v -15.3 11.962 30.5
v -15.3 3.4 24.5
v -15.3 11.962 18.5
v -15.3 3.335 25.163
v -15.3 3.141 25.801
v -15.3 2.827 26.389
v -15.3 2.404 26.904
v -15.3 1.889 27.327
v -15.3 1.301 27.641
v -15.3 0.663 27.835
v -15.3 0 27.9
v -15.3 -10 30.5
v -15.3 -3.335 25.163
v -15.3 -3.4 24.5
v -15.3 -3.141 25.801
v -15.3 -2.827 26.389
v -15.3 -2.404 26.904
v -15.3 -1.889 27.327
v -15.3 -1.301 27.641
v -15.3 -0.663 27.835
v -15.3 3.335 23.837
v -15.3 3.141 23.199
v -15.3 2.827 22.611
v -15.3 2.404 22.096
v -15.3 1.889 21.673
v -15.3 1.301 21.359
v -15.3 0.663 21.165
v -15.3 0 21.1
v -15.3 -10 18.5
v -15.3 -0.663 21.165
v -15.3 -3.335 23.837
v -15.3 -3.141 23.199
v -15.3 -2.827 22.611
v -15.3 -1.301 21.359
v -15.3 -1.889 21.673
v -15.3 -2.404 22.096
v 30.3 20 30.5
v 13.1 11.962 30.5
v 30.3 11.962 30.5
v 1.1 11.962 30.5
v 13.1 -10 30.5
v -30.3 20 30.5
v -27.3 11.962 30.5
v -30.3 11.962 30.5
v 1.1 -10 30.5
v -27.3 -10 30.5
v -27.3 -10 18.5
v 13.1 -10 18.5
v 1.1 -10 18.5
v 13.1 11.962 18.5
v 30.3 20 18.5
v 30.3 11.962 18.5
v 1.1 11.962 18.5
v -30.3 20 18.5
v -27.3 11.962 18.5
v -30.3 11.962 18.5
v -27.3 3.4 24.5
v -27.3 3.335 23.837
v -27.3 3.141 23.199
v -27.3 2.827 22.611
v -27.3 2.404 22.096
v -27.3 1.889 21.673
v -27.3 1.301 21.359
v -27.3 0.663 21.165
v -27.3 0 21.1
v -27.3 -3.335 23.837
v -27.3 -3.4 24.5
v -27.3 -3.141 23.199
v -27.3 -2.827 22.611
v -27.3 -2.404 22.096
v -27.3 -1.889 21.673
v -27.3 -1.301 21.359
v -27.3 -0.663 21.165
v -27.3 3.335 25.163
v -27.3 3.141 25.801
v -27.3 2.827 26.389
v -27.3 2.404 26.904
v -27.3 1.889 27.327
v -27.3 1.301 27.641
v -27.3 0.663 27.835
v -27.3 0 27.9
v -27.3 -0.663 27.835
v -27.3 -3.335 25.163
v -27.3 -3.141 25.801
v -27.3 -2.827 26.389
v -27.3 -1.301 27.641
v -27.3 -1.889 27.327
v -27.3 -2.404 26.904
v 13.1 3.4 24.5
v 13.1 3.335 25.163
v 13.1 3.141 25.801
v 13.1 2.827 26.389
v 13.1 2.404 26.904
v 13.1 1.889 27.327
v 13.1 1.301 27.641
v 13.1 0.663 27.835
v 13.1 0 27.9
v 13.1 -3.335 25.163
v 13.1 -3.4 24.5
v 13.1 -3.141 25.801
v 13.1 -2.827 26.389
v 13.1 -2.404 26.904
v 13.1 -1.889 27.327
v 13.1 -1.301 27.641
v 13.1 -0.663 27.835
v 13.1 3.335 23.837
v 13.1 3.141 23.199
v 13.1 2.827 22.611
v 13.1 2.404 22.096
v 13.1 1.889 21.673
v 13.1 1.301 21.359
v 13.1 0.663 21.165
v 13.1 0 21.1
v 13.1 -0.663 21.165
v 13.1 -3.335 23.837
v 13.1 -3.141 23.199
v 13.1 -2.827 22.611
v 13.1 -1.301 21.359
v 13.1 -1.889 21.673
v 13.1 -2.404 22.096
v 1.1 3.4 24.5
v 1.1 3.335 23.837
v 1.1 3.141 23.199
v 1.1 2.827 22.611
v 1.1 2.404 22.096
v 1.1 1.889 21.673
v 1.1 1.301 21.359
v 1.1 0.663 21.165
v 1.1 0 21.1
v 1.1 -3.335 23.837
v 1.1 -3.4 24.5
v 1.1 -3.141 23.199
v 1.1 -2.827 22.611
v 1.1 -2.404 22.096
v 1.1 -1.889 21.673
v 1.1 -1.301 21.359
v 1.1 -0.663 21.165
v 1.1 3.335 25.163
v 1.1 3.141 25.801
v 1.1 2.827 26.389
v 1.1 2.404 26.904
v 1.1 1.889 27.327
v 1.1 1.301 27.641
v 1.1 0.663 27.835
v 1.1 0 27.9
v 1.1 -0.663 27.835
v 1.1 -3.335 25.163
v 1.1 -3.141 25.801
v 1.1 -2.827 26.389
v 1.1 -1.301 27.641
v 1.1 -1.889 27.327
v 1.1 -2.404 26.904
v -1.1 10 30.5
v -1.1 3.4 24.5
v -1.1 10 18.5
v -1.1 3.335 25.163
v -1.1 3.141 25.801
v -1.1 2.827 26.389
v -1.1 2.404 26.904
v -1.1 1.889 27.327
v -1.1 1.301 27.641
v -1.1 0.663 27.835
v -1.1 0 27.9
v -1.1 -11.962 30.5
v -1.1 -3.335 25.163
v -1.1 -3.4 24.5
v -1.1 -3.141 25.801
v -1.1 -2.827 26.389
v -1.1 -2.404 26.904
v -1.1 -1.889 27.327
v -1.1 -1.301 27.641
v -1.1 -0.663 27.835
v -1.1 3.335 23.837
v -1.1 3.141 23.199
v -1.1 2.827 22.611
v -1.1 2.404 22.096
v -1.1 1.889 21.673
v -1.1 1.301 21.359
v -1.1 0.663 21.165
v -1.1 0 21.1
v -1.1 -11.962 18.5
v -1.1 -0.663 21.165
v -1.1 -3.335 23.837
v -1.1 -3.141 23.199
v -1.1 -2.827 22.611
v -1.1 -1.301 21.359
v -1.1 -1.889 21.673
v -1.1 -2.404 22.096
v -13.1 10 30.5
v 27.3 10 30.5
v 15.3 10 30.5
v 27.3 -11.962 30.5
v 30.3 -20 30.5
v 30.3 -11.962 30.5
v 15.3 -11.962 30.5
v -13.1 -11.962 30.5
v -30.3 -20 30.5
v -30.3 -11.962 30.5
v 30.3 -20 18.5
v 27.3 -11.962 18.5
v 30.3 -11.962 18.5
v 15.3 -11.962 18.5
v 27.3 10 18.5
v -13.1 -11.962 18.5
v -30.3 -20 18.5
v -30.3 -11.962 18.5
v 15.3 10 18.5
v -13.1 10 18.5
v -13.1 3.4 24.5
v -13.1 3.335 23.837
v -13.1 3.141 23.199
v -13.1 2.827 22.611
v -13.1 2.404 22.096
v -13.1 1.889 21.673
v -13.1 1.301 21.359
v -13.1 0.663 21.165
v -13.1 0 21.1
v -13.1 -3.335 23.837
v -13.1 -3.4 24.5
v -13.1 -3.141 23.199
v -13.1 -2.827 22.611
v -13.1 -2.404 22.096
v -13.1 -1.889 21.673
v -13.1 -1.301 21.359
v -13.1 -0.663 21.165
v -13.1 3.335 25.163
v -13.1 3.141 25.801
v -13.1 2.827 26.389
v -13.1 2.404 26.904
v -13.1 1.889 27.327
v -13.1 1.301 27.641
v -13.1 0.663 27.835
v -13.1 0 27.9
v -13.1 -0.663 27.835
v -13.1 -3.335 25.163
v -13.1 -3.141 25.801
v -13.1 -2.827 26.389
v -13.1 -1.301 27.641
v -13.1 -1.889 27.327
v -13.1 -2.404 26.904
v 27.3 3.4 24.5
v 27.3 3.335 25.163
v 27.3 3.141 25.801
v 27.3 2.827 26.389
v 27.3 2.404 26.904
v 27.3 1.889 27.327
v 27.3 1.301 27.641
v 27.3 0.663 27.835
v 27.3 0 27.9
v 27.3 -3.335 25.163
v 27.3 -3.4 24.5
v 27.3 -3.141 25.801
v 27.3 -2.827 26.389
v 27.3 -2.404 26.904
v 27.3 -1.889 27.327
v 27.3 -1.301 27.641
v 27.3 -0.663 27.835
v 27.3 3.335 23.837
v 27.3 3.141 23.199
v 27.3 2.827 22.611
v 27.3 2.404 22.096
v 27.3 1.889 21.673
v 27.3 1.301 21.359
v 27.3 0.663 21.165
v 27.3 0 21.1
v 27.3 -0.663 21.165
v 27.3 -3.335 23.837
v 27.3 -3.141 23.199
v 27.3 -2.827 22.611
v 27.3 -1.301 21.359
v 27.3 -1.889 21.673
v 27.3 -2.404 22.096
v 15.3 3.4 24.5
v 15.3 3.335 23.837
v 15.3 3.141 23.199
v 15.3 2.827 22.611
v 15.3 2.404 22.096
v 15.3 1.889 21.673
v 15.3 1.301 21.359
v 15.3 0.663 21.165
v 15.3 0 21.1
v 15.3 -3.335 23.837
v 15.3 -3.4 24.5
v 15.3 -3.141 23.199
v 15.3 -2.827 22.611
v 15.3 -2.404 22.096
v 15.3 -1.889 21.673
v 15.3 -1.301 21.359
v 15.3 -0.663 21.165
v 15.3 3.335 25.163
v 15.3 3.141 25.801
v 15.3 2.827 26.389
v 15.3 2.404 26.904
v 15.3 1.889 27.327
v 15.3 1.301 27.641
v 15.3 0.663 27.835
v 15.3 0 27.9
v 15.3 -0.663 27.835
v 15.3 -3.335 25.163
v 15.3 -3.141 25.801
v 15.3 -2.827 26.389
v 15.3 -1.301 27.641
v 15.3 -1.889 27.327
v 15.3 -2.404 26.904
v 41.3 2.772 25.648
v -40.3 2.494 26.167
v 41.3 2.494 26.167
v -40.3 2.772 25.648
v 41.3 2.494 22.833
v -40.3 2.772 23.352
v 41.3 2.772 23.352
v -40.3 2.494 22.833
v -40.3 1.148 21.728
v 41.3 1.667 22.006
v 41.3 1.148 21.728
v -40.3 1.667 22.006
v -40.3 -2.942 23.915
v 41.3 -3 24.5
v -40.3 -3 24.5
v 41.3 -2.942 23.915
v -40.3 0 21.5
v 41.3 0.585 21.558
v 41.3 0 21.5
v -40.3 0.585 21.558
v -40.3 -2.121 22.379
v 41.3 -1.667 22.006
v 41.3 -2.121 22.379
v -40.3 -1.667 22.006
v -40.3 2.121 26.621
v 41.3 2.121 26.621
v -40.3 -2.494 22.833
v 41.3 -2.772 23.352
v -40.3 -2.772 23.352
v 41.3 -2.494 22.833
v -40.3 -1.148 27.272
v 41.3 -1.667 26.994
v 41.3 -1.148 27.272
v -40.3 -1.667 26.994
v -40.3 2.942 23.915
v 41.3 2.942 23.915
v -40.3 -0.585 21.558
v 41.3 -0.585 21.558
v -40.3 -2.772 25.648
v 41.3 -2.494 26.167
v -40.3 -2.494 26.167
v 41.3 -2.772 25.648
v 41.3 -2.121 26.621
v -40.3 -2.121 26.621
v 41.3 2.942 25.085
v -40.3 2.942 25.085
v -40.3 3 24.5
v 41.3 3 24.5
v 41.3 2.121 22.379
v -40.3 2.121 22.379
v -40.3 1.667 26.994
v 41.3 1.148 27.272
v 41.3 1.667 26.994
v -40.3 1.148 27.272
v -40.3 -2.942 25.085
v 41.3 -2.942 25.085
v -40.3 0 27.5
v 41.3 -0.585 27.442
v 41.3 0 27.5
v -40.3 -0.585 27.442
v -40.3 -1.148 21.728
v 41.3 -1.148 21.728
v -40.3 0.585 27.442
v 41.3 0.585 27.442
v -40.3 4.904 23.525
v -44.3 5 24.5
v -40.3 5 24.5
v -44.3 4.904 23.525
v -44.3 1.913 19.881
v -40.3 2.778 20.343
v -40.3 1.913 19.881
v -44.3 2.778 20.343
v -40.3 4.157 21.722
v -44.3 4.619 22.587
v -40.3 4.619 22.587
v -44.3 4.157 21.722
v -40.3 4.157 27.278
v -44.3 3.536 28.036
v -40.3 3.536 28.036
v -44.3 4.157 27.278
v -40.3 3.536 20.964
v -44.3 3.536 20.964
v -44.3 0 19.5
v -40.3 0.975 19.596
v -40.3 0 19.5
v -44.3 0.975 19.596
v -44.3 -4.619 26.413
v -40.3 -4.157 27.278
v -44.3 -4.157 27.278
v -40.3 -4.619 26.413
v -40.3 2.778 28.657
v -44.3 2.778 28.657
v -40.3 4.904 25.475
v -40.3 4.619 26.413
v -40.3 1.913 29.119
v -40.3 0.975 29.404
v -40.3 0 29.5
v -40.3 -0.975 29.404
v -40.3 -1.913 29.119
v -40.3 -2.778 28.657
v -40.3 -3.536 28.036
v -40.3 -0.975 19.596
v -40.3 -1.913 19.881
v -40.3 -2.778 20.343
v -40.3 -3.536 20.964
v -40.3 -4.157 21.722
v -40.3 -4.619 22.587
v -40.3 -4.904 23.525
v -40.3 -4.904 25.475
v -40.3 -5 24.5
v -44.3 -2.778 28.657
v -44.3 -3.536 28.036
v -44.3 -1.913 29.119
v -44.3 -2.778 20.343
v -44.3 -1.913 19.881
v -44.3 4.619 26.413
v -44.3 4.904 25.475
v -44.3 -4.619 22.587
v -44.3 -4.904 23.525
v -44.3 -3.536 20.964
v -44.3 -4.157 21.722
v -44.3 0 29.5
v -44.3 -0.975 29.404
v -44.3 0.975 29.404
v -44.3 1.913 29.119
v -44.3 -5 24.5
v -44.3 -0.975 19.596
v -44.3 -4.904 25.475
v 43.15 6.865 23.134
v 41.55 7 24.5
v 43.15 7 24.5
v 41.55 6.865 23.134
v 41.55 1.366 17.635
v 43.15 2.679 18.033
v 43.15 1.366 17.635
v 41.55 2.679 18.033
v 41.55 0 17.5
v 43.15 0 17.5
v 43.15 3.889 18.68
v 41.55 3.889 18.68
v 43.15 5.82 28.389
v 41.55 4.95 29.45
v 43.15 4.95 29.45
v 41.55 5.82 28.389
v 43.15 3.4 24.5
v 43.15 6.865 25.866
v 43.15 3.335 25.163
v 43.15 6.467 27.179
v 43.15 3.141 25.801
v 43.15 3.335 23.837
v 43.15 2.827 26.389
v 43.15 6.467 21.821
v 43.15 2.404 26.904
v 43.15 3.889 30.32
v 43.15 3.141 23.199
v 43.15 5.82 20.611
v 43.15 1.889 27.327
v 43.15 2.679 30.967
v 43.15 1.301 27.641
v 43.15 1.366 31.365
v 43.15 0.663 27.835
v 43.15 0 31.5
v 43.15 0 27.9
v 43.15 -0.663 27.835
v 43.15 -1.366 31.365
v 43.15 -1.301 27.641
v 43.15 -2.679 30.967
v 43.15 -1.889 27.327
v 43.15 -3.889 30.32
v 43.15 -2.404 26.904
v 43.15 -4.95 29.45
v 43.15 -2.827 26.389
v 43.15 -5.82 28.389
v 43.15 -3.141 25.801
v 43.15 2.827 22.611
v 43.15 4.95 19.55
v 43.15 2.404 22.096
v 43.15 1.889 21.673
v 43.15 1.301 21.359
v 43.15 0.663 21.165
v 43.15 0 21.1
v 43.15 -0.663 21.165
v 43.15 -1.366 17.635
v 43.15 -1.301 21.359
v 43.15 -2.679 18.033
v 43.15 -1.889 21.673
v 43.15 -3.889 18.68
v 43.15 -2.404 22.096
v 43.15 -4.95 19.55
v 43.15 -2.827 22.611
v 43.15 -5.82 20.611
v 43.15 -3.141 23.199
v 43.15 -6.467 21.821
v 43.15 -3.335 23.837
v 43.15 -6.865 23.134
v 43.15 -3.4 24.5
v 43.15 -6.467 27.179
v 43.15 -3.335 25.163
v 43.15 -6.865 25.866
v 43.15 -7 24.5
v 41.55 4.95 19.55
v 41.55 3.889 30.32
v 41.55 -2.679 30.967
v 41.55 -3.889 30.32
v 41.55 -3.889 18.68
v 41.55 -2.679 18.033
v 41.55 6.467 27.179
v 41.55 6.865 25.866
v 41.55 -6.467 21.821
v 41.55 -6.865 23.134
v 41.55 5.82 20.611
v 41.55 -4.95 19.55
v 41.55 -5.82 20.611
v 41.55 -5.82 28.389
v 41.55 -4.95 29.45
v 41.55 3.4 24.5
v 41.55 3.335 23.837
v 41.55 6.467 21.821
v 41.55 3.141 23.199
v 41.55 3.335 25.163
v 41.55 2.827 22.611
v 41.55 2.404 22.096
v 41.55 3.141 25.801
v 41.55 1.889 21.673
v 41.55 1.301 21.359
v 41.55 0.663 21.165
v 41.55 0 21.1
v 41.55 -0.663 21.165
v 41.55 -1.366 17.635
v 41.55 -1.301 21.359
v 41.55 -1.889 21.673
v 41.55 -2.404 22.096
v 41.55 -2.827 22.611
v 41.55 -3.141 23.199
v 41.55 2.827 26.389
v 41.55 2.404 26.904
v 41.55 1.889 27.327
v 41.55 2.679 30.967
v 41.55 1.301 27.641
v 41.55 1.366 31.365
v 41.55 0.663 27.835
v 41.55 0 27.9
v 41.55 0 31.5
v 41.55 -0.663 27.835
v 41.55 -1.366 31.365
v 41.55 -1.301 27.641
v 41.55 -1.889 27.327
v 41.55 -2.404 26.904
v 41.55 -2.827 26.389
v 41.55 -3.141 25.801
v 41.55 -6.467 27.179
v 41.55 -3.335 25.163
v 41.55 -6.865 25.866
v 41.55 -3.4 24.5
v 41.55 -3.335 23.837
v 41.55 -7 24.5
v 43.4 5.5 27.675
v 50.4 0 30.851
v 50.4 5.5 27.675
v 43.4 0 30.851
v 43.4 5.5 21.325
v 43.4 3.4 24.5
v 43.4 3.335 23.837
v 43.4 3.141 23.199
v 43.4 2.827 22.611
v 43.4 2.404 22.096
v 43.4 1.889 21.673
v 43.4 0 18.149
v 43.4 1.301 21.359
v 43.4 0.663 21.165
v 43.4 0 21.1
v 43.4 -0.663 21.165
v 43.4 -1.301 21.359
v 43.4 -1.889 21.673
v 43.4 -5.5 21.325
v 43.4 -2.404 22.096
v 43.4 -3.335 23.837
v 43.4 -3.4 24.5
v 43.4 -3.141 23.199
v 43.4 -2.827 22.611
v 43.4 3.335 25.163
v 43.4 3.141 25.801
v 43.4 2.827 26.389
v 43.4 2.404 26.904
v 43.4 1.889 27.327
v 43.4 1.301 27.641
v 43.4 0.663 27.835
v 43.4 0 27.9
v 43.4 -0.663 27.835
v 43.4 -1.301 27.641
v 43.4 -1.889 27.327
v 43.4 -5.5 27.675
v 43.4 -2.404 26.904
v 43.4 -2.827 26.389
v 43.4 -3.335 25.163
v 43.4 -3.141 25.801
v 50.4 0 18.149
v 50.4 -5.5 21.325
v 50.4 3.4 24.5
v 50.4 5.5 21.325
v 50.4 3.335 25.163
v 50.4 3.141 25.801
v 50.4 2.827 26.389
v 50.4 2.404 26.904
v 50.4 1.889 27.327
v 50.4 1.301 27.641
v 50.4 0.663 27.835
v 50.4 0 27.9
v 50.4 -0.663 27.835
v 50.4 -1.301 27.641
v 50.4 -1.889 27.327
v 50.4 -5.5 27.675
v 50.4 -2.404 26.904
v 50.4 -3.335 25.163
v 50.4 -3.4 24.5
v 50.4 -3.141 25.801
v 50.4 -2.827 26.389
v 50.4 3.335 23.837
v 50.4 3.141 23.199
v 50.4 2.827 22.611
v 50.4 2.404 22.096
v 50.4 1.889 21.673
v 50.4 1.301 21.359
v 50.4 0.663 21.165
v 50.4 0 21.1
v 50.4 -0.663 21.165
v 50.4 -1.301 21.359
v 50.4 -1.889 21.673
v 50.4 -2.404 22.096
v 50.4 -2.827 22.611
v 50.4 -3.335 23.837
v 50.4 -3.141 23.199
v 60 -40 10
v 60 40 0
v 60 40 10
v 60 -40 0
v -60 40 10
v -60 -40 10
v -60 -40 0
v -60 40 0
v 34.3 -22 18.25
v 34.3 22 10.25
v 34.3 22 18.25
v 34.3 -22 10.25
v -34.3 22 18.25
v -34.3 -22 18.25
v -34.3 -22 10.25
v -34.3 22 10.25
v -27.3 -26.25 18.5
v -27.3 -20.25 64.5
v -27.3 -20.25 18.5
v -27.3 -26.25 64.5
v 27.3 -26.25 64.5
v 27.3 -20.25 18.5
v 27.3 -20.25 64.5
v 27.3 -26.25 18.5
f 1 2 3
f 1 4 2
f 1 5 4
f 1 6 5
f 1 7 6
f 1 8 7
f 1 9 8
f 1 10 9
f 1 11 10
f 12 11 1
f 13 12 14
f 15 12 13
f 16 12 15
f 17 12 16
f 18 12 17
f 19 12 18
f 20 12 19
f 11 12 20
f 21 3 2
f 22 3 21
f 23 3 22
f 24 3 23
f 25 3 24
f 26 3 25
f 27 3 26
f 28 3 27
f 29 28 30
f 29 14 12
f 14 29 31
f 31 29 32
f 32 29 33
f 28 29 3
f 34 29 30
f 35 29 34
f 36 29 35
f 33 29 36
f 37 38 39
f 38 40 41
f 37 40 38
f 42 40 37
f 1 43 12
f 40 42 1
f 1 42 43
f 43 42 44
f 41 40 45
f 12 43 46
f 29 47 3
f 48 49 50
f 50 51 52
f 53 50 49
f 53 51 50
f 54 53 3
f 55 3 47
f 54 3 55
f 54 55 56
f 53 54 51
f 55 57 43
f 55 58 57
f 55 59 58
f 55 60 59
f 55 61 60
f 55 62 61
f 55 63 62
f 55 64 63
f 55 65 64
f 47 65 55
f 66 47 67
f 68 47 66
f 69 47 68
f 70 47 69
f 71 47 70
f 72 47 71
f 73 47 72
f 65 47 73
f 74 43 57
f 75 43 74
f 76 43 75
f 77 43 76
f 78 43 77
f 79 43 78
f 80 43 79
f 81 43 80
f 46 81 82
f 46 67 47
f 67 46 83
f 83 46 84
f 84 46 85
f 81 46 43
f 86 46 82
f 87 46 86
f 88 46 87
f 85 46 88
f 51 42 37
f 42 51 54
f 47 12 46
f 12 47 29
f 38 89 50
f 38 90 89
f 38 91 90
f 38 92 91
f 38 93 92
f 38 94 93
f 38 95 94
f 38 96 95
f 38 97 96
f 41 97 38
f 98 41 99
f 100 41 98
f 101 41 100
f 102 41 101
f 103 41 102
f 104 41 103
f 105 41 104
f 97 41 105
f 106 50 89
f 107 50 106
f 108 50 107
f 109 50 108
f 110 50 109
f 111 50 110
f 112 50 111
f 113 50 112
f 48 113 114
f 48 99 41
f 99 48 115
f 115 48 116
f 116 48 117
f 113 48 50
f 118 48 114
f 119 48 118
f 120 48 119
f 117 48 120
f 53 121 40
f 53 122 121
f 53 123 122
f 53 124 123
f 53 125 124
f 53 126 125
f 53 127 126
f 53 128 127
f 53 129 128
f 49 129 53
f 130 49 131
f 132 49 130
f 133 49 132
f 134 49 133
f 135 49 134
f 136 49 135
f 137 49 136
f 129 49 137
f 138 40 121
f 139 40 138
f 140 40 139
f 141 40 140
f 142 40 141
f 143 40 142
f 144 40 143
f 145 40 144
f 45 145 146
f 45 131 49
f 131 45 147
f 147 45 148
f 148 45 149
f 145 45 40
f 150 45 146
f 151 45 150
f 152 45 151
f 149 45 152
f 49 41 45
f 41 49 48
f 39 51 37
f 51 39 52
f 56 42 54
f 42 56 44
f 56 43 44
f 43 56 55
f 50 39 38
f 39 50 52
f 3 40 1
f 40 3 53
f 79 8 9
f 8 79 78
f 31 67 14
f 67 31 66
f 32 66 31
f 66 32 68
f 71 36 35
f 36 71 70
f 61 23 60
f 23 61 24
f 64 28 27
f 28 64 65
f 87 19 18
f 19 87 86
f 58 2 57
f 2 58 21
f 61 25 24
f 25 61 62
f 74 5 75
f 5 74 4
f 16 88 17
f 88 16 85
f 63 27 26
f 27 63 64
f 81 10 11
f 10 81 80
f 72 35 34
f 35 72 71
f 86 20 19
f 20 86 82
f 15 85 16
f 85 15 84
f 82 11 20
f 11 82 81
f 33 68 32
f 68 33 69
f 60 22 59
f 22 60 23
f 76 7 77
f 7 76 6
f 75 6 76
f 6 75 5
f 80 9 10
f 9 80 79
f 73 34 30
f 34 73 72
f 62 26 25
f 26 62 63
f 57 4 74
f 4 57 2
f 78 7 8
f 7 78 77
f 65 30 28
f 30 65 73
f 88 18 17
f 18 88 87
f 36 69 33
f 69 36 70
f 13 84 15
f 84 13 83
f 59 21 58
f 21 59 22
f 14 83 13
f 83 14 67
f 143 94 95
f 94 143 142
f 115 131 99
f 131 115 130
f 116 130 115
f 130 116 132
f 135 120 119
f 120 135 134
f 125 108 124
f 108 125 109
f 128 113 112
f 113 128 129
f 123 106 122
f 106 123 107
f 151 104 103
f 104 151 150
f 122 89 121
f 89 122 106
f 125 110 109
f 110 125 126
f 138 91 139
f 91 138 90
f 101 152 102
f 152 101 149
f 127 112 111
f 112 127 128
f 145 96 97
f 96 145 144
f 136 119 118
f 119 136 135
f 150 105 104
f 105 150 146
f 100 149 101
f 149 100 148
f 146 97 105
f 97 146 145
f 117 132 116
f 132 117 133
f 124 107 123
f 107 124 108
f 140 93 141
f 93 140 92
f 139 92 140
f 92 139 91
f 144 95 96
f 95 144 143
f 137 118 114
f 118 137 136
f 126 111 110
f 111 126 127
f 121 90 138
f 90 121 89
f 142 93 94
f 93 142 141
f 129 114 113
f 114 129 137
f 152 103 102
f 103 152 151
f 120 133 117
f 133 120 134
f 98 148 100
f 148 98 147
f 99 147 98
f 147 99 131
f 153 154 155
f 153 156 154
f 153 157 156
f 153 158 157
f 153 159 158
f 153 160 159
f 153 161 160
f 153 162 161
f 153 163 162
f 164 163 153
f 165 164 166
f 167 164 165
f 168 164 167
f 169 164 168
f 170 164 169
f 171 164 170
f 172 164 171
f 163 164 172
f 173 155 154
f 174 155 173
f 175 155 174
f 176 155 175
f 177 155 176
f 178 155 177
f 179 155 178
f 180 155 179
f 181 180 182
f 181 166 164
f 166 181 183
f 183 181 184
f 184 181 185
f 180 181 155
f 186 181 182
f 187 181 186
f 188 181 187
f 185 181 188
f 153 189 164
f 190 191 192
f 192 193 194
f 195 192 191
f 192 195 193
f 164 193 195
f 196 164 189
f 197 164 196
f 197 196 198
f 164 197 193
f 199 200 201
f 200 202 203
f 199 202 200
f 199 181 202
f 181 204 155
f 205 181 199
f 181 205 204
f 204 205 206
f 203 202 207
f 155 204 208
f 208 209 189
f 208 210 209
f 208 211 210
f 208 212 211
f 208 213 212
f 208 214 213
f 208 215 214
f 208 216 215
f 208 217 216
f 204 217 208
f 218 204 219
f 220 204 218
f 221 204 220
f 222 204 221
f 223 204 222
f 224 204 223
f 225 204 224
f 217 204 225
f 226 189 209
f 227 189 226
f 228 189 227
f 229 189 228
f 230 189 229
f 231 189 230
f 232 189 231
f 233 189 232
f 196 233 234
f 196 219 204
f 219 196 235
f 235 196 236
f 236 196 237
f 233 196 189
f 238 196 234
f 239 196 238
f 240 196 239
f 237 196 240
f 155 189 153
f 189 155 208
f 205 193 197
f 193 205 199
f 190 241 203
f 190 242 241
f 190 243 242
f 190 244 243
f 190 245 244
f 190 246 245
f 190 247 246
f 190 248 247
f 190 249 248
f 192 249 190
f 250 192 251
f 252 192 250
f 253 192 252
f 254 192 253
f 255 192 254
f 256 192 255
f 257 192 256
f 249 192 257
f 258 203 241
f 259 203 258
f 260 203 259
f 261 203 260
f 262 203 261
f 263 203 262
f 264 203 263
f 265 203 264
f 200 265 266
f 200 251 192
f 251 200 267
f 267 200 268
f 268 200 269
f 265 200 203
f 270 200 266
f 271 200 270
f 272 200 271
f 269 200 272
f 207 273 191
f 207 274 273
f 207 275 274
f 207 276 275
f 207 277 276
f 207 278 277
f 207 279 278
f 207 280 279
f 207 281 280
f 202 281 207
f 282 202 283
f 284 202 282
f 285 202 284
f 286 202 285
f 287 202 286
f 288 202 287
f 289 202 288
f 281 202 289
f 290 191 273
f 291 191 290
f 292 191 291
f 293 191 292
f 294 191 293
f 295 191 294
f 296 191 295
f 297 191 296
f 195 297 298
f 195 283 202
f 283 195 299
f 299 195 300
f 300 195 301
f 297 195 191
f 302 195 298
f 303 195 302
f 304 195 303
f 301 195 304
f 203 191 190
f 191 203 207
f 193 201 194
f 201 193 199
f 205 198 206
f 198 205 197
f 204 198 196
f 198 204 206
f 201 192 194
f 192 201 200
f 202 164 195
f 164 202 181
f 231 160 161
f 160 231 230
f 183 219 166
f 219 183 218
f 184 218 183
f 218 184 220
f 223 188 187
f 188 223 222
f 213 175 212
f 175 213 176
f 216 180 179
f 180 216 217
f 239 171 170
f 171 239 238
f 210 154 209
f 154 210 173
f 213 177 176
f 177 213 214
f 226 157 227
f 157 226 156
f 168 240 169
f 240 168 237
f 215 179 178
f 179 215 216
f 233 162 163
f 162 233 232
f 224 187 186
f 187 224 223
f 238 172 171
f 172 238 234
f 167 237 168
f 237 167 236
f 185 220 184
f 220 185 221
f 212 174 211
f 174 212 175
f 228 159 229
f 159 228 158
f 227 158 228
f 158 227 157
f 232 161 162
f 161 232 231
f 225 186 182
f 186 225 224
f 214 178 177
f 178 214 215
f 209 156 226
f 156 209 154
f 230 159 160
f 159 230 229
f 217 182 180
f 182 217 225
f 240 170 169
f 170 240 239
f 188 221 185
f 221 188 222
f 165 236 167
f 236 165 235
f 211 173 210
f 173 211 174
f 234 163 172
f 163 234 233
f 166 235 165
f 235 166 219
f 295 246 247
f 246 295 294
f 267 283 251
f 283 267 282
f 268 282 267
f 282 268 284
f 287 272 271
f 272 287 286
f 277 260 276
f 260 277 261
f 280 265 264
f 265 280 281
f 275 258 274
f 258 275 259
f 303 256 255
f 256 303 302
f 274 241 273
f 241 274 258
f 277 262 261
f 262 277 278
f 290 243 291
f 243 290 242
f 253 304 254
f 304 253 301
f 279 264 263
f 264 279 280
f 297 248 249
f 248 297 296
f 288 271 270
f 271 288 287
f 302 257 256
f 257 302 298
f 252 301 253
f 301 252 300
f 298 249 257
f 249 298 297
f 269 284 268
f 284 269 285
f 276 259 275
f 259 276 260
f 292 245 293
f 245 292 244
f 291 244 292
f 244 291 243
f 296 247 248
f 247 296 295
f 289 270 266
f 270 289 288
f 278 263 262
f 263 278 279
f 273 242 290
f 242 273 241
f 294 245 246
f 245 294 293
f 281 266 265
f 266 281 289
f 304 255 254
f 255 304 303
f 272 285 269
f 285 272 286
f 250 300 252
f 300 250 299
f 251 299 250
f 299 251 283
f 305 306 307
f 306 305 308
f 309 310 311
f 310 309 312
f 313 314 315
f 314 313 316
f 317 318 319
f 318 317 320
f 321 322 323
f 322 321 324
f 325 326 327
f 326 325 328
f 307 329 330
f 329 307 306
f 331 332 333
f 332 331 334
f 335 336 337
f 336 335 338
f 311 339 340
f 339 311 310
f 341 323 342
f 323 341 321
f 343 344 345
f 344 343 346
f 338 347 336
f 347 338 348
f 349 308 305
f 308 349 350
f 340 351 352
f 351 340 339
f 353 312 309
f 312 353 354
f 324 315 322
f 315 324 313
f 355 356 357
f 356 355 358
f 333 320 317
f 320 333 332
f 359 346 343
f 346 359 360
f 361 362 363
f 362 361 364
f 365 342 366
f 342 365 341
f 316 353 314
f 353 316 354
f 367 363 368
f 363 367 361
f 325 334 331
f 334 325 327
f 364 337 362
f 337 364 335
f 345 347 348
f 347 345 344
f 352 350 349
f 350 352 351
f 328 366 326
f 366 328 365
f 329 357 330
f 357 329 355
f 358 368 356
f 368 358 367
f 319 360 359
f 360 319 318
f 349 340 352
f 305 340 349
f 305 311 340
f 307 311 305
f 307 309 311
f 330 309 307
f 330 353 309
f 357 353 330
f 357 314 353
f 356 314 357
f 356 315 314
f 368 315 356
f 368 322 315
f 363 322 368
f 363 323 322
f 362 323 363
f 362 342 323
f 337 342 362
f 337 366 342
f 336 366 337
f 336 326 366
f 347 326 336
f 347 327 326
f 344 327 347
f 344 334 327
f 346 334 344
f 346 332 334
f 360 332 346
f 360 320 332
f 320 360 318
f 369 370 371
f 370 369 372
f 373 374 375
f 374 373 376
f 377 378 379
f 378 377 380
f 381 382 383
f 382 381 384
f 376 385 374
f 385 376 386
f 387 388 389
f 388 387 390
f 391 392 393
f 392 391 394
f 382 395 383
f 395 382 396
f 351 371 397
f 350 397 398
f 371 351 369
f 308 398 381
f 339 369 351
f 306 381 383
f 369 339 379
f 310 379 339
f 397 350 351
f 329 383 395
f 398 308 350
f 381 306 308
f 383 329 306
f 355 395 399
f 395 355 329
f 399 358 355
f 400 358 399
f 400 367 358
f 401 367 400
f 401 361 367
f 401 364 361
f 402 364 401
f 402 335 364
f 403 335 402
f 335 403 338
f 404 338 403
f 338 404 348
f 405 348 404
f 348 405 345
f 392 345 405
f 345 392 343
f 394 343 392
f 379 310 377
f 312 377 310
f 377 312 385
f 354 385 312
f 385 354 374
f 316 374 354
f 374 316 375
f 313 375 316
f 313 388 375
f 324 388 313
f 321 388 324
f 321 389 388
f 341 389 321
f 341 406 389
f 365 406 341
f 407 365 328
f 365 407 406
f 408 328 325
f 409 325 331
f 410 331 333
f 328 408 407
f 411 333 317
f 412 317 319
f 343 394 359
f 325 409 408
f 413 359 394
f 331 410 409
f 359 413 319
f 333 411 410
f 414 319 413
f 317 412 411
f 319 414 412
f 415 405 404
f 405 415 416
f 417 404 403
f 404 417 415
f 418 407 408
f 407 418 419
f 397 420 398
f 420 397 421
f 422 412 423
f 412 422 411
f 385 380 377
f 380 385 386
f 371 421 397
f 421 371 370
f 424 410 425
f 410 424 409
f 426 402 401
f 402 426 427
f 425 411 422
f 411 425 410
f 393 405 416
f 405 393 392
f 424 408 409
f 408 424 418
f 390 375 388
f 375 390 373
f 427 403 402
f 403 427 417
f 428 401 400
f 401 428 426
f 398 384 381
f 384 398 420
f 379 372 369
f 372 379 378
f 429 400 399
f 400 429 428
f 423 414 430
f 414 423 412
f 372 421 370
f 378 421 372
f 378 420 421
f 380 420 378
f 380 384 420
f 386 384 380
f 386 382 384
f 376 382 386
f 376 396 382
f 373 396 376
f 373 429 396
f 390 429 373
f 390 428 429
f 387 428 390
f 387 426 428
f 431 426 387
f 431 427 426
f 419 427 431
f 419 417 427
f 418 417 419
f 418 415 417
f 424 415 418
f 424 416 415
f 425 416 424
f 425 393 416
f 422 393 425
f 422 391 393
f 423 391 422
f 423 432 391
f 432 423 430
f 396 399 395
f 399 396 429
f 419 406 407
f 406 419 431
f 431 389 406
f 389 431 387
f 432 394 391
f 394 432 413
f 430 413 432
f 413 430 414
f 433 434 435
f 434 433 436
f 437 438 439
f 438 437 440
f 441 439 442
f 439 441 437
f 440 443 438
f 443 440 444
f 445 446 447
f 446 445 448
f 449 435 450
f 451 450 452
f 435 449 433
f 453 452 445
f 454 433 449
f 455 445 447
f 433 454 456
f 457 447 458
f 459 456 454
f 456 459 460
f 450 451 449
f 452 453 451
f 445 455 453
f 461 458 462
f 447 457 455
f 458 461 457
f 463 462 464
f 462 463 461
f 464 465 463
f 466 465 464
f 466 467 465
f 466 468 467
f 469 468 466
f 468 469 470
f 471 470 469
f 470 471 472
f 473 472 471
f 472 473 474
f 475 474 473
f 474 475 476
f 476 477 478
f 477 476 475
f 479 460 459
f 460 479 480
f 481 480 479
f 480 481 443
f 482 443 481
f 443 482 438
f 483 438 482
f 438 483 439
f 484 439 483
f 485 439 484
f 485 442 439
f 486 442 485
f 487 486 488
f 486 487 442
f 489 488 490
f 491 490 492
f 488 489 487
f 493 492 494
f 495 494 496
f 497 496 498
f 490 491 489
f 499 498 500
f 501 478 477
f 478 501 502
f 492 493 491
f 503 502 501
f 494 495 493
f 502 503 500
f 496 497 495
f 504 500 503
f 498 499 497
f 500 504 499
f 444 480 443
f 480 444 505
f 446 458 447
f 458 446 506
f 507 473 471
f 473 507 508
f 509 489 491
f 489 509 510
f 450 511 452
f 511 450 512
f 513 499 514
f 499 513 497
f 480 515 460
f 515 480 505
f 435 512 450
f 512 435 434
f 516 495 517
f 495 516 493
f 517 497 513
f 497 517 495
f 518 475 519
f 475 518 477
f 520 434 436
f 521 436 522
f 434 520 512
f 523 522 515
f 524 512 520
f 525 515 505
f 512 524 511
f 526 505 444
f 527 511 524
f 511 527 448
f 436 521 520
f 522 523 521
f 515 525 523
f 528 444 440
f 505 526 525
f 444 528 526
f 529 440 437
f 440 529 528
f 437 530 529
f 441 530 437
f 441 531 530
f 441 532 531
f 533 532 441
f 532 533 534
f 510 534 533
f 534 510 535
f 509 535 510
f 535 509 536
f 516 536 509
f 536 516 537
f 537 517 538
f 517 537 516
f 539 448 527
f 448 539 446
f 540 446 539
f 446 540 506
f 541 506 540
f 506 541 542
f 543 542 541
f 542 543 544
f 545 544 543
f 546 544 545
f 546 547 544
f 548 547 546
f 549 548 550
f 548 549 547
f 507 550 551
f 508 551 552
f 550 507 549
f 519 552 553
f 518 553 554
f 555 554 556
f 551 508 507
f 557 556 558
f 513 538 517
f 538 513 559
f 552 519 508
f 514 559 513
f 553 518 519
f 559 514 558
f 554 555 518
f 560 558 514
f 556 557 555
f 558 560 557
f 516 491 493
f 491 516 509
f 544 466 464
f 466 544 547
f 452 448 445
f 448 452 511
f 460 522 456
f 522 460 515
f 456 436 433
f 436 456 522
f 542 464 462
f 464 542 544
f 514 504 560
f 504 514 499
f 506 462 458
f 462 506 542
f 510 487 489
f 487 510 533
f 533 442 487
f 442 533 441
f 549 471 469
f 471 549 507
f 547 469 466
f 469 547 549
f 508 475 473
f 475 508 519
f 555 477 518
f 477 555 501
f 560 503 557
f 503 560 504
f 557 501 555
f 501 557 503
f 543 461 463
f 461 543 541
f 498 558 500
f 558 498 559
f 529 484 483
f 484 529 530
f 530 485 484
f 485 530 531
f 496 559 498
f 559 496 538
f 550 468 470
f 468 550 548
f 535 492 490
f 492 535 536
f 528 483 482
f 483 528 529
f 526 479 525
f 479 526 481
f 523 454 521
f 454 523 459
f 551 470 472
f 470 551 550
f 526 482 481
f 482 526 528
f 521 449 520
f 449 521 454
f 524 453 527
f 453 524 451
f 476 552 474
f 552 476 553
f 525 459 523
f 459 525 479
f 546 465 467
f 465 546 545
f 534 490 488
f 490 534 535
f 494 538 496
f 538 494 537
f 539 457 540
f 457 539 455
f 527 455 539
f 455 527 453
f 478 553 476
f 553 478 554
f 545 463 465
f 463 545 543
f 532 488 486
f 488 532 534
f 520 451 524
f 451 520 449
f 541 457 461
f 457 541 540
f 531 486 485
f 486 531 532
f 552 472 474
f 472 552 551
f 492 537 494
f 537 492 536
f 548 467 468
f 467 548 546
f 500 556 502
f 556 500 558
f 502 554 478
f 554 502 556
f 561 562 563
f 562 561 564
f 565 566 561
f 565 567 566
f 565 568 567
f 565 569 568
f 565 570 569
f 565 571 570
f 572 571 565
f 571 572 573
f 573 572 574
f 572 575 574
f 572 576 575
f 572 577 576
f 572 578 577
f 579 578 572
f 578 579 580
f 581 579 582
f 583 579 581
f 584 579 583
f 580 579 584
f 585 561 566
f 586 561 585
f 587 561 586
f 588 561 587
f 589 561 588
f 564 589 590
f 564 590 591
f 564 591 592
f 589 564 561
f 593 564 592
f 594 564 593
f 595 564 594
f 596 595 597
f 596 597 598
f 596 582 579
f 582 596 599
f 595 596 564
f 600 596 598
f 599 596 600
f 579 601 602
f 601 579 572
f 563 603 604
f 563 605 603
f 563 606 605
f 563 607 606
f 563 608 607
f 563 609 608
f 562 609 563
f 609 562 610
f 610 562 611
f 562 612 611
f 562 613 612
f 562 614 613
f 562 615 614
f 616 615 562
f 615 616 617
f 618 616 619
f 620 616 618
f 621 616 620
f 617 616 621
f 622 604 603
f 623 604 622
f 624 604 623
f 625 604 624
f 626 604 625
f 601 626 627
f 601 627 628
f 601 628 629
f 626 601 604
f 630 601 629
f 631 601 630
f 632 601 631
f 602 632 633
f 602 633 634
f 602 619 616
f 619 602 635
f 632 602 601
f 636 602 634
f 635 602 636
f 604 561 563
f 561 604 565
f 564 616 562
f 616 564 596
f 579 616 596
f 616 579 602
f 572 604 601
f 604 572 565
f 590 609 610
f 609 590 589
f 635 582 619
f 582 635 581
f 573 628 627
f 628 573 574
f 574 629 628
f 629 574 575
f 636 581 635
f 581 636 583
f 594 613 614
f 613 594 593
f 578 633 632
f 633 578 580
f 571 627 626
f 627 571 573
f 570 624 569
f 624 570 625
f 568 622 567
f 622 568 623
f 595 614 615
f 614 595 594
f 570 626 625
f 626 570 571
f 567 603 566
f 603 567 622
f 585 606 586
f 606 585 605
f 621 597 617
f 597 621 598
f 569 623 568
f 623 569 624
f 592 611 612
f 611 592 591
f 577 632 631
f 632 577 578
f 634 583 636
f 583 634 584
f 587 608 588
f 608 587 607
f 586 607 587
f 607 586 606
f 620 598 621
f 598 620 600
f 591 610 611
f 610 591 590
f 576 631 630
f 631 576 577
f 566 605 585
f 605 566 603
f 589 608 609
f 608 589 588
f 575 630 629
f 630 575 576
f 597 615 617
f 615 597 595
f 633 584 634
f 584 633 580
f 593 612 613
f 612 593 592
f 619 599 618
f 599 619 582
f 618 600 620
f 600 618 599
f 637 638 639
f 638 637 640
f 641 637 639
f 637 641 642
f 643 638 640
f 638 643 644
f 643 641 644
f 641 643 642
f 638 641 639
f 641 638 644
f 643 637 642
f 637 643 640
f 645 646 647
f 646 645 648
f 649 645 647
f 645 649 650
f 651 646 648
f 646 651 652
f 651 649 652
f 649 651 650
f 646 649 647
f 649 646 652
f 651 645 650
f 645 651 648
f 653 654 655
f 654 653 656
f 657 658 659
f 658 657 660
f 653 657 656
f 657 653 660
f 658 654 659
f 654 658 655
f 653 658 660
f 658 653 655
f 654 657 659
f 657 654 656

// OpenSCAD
$fn = 32;

// ------------------------------------------------------------------------
// Comb hinge with flap: leaf 60.6 x 20 mm, pin d6, flap 46 mm
// Every part is its own module, assembly() places every instance.
// ------------------------------------------------------------------------

// --- part 1 ---
module hinge_bed() {
  difference() {
    translate([-60, -40, 0]) cube([120, 80, 10]);
  }
}

// --- part 2 ---
module hinge_riser() {
  difference() {
    translate([-34.3, -22, 0]) cube([68.6, 44, 8]);
  }
}

// --- part 3 ---
module hinge_leaf_a() {
  difference() {
    union() {
      translate([-27.3, -10, -6]) cube([12, 30, 12]);
      translate([1.1, -10, -6]) cube([12, 30, 12]);
      translate([-30.3, 11.962, -6]) cube([60.6, 8.038, 12]);
    }
    translate([-21.3, 0, 0]) rotate([0, 90, 0]) cylinder(h = 14, d = 6.8, center = true);
    translate([7.1, 0, 0]) rotate([0, 90, 0]) cylinder(h = 14, d = 6.8, center = true);
  }
}

// --- part 4 ---
module hinge_leaf_b() {
  difference() {
    union() {
      translate([-13.1, -20, -6]) cube([12, 30, 12]);
      translate([15.3, -20, -6]) cube([12, 30, 12]);
      translate([-30.3, -20, -6]) cube([60.6, 8.038, 12]);
    }
    translate([-7.1, 0, 0]) rotate([0, 90, 0]) cylinder(h = 14, d = 6.8, center = true);
    translate([21.3, 0, 0]) rotate([0, 90, 0]) cylinder(h = 14, d = 6.8, center = true);
  }
}

// --- part 5 ---
module hinge_flap() {
  difference() {
    translate([-27.3, -23, 0]) cube([54.6, 46, 6]);
  }
}

// --- part 6 ---
module hinge_pin() {
  rotate([0, 90, 0]) cylinder(h = 82.6, d = 6, center = true);
  translate([-44.3, 0, 0]) rotate([0, 90, 0]) cylinder(h = 4, d = 10);
}

// --- part 7 ---
module pin_washer() {
  difference() {
      translate([0, 0, 0]) cylinder(h = 1.6, d = 14);
      translate([0, 0, -1]) cylinder(h = 3.6, d = 6.8);
    }
}

// --- part 8 ---
module pin_nut() {
  difference() {
    linear_extrude(height = 7) polygon(points = [[6.351, 0], [3.175, 5.5], [-3.175, 5.5], [-6.351, 0], [-3.175, -5.5], [3.175, -5.5]]);
    translate([0, 0, -1]) cylinder(h = 9, d = 6.8);
  }
}

// --- assembly ---
module assembly() {
  color([0.80, 0.24, 0.20]) translate([0, 0, 0]) rotate([0, 0, 0]) hinge_bed();
  color([0.20, 0.45, 0.75]) translate([0, 0, 10.25]) rotate([0, 0, 0]) hinge_riser();
  color([0.25, 0.62, 0.32]) translate([0, 0, 24.5]) rotate([0, 0, 0]) hinge_leaf_a();
  color([0.92, 0.70, 0.18]) translate([0, 0, 24.5]) rotate([0, 0, 0]) hinge_leaf_b();
  color([0.58, 0.35, 0.70]) translate([0, -20.25, 41.5]) rotate([90, 0, 0]) hinge_flap();
  color([0.16, 0.66, 0.66]) translate([0, 0, 24.5]) rotate([0, 0, 0]) hinge_pin();
  color([0.85, 0.48, 0.18]) translate([41.55, 0, 24.5]) rotate([0, 90, 0]) pin_washer();
  color([0.55, 0.60, 0.65]) translate([43.4, 0, 24.5]) rotate([0, 90, 0]) pin_nut();
}

assembly();
